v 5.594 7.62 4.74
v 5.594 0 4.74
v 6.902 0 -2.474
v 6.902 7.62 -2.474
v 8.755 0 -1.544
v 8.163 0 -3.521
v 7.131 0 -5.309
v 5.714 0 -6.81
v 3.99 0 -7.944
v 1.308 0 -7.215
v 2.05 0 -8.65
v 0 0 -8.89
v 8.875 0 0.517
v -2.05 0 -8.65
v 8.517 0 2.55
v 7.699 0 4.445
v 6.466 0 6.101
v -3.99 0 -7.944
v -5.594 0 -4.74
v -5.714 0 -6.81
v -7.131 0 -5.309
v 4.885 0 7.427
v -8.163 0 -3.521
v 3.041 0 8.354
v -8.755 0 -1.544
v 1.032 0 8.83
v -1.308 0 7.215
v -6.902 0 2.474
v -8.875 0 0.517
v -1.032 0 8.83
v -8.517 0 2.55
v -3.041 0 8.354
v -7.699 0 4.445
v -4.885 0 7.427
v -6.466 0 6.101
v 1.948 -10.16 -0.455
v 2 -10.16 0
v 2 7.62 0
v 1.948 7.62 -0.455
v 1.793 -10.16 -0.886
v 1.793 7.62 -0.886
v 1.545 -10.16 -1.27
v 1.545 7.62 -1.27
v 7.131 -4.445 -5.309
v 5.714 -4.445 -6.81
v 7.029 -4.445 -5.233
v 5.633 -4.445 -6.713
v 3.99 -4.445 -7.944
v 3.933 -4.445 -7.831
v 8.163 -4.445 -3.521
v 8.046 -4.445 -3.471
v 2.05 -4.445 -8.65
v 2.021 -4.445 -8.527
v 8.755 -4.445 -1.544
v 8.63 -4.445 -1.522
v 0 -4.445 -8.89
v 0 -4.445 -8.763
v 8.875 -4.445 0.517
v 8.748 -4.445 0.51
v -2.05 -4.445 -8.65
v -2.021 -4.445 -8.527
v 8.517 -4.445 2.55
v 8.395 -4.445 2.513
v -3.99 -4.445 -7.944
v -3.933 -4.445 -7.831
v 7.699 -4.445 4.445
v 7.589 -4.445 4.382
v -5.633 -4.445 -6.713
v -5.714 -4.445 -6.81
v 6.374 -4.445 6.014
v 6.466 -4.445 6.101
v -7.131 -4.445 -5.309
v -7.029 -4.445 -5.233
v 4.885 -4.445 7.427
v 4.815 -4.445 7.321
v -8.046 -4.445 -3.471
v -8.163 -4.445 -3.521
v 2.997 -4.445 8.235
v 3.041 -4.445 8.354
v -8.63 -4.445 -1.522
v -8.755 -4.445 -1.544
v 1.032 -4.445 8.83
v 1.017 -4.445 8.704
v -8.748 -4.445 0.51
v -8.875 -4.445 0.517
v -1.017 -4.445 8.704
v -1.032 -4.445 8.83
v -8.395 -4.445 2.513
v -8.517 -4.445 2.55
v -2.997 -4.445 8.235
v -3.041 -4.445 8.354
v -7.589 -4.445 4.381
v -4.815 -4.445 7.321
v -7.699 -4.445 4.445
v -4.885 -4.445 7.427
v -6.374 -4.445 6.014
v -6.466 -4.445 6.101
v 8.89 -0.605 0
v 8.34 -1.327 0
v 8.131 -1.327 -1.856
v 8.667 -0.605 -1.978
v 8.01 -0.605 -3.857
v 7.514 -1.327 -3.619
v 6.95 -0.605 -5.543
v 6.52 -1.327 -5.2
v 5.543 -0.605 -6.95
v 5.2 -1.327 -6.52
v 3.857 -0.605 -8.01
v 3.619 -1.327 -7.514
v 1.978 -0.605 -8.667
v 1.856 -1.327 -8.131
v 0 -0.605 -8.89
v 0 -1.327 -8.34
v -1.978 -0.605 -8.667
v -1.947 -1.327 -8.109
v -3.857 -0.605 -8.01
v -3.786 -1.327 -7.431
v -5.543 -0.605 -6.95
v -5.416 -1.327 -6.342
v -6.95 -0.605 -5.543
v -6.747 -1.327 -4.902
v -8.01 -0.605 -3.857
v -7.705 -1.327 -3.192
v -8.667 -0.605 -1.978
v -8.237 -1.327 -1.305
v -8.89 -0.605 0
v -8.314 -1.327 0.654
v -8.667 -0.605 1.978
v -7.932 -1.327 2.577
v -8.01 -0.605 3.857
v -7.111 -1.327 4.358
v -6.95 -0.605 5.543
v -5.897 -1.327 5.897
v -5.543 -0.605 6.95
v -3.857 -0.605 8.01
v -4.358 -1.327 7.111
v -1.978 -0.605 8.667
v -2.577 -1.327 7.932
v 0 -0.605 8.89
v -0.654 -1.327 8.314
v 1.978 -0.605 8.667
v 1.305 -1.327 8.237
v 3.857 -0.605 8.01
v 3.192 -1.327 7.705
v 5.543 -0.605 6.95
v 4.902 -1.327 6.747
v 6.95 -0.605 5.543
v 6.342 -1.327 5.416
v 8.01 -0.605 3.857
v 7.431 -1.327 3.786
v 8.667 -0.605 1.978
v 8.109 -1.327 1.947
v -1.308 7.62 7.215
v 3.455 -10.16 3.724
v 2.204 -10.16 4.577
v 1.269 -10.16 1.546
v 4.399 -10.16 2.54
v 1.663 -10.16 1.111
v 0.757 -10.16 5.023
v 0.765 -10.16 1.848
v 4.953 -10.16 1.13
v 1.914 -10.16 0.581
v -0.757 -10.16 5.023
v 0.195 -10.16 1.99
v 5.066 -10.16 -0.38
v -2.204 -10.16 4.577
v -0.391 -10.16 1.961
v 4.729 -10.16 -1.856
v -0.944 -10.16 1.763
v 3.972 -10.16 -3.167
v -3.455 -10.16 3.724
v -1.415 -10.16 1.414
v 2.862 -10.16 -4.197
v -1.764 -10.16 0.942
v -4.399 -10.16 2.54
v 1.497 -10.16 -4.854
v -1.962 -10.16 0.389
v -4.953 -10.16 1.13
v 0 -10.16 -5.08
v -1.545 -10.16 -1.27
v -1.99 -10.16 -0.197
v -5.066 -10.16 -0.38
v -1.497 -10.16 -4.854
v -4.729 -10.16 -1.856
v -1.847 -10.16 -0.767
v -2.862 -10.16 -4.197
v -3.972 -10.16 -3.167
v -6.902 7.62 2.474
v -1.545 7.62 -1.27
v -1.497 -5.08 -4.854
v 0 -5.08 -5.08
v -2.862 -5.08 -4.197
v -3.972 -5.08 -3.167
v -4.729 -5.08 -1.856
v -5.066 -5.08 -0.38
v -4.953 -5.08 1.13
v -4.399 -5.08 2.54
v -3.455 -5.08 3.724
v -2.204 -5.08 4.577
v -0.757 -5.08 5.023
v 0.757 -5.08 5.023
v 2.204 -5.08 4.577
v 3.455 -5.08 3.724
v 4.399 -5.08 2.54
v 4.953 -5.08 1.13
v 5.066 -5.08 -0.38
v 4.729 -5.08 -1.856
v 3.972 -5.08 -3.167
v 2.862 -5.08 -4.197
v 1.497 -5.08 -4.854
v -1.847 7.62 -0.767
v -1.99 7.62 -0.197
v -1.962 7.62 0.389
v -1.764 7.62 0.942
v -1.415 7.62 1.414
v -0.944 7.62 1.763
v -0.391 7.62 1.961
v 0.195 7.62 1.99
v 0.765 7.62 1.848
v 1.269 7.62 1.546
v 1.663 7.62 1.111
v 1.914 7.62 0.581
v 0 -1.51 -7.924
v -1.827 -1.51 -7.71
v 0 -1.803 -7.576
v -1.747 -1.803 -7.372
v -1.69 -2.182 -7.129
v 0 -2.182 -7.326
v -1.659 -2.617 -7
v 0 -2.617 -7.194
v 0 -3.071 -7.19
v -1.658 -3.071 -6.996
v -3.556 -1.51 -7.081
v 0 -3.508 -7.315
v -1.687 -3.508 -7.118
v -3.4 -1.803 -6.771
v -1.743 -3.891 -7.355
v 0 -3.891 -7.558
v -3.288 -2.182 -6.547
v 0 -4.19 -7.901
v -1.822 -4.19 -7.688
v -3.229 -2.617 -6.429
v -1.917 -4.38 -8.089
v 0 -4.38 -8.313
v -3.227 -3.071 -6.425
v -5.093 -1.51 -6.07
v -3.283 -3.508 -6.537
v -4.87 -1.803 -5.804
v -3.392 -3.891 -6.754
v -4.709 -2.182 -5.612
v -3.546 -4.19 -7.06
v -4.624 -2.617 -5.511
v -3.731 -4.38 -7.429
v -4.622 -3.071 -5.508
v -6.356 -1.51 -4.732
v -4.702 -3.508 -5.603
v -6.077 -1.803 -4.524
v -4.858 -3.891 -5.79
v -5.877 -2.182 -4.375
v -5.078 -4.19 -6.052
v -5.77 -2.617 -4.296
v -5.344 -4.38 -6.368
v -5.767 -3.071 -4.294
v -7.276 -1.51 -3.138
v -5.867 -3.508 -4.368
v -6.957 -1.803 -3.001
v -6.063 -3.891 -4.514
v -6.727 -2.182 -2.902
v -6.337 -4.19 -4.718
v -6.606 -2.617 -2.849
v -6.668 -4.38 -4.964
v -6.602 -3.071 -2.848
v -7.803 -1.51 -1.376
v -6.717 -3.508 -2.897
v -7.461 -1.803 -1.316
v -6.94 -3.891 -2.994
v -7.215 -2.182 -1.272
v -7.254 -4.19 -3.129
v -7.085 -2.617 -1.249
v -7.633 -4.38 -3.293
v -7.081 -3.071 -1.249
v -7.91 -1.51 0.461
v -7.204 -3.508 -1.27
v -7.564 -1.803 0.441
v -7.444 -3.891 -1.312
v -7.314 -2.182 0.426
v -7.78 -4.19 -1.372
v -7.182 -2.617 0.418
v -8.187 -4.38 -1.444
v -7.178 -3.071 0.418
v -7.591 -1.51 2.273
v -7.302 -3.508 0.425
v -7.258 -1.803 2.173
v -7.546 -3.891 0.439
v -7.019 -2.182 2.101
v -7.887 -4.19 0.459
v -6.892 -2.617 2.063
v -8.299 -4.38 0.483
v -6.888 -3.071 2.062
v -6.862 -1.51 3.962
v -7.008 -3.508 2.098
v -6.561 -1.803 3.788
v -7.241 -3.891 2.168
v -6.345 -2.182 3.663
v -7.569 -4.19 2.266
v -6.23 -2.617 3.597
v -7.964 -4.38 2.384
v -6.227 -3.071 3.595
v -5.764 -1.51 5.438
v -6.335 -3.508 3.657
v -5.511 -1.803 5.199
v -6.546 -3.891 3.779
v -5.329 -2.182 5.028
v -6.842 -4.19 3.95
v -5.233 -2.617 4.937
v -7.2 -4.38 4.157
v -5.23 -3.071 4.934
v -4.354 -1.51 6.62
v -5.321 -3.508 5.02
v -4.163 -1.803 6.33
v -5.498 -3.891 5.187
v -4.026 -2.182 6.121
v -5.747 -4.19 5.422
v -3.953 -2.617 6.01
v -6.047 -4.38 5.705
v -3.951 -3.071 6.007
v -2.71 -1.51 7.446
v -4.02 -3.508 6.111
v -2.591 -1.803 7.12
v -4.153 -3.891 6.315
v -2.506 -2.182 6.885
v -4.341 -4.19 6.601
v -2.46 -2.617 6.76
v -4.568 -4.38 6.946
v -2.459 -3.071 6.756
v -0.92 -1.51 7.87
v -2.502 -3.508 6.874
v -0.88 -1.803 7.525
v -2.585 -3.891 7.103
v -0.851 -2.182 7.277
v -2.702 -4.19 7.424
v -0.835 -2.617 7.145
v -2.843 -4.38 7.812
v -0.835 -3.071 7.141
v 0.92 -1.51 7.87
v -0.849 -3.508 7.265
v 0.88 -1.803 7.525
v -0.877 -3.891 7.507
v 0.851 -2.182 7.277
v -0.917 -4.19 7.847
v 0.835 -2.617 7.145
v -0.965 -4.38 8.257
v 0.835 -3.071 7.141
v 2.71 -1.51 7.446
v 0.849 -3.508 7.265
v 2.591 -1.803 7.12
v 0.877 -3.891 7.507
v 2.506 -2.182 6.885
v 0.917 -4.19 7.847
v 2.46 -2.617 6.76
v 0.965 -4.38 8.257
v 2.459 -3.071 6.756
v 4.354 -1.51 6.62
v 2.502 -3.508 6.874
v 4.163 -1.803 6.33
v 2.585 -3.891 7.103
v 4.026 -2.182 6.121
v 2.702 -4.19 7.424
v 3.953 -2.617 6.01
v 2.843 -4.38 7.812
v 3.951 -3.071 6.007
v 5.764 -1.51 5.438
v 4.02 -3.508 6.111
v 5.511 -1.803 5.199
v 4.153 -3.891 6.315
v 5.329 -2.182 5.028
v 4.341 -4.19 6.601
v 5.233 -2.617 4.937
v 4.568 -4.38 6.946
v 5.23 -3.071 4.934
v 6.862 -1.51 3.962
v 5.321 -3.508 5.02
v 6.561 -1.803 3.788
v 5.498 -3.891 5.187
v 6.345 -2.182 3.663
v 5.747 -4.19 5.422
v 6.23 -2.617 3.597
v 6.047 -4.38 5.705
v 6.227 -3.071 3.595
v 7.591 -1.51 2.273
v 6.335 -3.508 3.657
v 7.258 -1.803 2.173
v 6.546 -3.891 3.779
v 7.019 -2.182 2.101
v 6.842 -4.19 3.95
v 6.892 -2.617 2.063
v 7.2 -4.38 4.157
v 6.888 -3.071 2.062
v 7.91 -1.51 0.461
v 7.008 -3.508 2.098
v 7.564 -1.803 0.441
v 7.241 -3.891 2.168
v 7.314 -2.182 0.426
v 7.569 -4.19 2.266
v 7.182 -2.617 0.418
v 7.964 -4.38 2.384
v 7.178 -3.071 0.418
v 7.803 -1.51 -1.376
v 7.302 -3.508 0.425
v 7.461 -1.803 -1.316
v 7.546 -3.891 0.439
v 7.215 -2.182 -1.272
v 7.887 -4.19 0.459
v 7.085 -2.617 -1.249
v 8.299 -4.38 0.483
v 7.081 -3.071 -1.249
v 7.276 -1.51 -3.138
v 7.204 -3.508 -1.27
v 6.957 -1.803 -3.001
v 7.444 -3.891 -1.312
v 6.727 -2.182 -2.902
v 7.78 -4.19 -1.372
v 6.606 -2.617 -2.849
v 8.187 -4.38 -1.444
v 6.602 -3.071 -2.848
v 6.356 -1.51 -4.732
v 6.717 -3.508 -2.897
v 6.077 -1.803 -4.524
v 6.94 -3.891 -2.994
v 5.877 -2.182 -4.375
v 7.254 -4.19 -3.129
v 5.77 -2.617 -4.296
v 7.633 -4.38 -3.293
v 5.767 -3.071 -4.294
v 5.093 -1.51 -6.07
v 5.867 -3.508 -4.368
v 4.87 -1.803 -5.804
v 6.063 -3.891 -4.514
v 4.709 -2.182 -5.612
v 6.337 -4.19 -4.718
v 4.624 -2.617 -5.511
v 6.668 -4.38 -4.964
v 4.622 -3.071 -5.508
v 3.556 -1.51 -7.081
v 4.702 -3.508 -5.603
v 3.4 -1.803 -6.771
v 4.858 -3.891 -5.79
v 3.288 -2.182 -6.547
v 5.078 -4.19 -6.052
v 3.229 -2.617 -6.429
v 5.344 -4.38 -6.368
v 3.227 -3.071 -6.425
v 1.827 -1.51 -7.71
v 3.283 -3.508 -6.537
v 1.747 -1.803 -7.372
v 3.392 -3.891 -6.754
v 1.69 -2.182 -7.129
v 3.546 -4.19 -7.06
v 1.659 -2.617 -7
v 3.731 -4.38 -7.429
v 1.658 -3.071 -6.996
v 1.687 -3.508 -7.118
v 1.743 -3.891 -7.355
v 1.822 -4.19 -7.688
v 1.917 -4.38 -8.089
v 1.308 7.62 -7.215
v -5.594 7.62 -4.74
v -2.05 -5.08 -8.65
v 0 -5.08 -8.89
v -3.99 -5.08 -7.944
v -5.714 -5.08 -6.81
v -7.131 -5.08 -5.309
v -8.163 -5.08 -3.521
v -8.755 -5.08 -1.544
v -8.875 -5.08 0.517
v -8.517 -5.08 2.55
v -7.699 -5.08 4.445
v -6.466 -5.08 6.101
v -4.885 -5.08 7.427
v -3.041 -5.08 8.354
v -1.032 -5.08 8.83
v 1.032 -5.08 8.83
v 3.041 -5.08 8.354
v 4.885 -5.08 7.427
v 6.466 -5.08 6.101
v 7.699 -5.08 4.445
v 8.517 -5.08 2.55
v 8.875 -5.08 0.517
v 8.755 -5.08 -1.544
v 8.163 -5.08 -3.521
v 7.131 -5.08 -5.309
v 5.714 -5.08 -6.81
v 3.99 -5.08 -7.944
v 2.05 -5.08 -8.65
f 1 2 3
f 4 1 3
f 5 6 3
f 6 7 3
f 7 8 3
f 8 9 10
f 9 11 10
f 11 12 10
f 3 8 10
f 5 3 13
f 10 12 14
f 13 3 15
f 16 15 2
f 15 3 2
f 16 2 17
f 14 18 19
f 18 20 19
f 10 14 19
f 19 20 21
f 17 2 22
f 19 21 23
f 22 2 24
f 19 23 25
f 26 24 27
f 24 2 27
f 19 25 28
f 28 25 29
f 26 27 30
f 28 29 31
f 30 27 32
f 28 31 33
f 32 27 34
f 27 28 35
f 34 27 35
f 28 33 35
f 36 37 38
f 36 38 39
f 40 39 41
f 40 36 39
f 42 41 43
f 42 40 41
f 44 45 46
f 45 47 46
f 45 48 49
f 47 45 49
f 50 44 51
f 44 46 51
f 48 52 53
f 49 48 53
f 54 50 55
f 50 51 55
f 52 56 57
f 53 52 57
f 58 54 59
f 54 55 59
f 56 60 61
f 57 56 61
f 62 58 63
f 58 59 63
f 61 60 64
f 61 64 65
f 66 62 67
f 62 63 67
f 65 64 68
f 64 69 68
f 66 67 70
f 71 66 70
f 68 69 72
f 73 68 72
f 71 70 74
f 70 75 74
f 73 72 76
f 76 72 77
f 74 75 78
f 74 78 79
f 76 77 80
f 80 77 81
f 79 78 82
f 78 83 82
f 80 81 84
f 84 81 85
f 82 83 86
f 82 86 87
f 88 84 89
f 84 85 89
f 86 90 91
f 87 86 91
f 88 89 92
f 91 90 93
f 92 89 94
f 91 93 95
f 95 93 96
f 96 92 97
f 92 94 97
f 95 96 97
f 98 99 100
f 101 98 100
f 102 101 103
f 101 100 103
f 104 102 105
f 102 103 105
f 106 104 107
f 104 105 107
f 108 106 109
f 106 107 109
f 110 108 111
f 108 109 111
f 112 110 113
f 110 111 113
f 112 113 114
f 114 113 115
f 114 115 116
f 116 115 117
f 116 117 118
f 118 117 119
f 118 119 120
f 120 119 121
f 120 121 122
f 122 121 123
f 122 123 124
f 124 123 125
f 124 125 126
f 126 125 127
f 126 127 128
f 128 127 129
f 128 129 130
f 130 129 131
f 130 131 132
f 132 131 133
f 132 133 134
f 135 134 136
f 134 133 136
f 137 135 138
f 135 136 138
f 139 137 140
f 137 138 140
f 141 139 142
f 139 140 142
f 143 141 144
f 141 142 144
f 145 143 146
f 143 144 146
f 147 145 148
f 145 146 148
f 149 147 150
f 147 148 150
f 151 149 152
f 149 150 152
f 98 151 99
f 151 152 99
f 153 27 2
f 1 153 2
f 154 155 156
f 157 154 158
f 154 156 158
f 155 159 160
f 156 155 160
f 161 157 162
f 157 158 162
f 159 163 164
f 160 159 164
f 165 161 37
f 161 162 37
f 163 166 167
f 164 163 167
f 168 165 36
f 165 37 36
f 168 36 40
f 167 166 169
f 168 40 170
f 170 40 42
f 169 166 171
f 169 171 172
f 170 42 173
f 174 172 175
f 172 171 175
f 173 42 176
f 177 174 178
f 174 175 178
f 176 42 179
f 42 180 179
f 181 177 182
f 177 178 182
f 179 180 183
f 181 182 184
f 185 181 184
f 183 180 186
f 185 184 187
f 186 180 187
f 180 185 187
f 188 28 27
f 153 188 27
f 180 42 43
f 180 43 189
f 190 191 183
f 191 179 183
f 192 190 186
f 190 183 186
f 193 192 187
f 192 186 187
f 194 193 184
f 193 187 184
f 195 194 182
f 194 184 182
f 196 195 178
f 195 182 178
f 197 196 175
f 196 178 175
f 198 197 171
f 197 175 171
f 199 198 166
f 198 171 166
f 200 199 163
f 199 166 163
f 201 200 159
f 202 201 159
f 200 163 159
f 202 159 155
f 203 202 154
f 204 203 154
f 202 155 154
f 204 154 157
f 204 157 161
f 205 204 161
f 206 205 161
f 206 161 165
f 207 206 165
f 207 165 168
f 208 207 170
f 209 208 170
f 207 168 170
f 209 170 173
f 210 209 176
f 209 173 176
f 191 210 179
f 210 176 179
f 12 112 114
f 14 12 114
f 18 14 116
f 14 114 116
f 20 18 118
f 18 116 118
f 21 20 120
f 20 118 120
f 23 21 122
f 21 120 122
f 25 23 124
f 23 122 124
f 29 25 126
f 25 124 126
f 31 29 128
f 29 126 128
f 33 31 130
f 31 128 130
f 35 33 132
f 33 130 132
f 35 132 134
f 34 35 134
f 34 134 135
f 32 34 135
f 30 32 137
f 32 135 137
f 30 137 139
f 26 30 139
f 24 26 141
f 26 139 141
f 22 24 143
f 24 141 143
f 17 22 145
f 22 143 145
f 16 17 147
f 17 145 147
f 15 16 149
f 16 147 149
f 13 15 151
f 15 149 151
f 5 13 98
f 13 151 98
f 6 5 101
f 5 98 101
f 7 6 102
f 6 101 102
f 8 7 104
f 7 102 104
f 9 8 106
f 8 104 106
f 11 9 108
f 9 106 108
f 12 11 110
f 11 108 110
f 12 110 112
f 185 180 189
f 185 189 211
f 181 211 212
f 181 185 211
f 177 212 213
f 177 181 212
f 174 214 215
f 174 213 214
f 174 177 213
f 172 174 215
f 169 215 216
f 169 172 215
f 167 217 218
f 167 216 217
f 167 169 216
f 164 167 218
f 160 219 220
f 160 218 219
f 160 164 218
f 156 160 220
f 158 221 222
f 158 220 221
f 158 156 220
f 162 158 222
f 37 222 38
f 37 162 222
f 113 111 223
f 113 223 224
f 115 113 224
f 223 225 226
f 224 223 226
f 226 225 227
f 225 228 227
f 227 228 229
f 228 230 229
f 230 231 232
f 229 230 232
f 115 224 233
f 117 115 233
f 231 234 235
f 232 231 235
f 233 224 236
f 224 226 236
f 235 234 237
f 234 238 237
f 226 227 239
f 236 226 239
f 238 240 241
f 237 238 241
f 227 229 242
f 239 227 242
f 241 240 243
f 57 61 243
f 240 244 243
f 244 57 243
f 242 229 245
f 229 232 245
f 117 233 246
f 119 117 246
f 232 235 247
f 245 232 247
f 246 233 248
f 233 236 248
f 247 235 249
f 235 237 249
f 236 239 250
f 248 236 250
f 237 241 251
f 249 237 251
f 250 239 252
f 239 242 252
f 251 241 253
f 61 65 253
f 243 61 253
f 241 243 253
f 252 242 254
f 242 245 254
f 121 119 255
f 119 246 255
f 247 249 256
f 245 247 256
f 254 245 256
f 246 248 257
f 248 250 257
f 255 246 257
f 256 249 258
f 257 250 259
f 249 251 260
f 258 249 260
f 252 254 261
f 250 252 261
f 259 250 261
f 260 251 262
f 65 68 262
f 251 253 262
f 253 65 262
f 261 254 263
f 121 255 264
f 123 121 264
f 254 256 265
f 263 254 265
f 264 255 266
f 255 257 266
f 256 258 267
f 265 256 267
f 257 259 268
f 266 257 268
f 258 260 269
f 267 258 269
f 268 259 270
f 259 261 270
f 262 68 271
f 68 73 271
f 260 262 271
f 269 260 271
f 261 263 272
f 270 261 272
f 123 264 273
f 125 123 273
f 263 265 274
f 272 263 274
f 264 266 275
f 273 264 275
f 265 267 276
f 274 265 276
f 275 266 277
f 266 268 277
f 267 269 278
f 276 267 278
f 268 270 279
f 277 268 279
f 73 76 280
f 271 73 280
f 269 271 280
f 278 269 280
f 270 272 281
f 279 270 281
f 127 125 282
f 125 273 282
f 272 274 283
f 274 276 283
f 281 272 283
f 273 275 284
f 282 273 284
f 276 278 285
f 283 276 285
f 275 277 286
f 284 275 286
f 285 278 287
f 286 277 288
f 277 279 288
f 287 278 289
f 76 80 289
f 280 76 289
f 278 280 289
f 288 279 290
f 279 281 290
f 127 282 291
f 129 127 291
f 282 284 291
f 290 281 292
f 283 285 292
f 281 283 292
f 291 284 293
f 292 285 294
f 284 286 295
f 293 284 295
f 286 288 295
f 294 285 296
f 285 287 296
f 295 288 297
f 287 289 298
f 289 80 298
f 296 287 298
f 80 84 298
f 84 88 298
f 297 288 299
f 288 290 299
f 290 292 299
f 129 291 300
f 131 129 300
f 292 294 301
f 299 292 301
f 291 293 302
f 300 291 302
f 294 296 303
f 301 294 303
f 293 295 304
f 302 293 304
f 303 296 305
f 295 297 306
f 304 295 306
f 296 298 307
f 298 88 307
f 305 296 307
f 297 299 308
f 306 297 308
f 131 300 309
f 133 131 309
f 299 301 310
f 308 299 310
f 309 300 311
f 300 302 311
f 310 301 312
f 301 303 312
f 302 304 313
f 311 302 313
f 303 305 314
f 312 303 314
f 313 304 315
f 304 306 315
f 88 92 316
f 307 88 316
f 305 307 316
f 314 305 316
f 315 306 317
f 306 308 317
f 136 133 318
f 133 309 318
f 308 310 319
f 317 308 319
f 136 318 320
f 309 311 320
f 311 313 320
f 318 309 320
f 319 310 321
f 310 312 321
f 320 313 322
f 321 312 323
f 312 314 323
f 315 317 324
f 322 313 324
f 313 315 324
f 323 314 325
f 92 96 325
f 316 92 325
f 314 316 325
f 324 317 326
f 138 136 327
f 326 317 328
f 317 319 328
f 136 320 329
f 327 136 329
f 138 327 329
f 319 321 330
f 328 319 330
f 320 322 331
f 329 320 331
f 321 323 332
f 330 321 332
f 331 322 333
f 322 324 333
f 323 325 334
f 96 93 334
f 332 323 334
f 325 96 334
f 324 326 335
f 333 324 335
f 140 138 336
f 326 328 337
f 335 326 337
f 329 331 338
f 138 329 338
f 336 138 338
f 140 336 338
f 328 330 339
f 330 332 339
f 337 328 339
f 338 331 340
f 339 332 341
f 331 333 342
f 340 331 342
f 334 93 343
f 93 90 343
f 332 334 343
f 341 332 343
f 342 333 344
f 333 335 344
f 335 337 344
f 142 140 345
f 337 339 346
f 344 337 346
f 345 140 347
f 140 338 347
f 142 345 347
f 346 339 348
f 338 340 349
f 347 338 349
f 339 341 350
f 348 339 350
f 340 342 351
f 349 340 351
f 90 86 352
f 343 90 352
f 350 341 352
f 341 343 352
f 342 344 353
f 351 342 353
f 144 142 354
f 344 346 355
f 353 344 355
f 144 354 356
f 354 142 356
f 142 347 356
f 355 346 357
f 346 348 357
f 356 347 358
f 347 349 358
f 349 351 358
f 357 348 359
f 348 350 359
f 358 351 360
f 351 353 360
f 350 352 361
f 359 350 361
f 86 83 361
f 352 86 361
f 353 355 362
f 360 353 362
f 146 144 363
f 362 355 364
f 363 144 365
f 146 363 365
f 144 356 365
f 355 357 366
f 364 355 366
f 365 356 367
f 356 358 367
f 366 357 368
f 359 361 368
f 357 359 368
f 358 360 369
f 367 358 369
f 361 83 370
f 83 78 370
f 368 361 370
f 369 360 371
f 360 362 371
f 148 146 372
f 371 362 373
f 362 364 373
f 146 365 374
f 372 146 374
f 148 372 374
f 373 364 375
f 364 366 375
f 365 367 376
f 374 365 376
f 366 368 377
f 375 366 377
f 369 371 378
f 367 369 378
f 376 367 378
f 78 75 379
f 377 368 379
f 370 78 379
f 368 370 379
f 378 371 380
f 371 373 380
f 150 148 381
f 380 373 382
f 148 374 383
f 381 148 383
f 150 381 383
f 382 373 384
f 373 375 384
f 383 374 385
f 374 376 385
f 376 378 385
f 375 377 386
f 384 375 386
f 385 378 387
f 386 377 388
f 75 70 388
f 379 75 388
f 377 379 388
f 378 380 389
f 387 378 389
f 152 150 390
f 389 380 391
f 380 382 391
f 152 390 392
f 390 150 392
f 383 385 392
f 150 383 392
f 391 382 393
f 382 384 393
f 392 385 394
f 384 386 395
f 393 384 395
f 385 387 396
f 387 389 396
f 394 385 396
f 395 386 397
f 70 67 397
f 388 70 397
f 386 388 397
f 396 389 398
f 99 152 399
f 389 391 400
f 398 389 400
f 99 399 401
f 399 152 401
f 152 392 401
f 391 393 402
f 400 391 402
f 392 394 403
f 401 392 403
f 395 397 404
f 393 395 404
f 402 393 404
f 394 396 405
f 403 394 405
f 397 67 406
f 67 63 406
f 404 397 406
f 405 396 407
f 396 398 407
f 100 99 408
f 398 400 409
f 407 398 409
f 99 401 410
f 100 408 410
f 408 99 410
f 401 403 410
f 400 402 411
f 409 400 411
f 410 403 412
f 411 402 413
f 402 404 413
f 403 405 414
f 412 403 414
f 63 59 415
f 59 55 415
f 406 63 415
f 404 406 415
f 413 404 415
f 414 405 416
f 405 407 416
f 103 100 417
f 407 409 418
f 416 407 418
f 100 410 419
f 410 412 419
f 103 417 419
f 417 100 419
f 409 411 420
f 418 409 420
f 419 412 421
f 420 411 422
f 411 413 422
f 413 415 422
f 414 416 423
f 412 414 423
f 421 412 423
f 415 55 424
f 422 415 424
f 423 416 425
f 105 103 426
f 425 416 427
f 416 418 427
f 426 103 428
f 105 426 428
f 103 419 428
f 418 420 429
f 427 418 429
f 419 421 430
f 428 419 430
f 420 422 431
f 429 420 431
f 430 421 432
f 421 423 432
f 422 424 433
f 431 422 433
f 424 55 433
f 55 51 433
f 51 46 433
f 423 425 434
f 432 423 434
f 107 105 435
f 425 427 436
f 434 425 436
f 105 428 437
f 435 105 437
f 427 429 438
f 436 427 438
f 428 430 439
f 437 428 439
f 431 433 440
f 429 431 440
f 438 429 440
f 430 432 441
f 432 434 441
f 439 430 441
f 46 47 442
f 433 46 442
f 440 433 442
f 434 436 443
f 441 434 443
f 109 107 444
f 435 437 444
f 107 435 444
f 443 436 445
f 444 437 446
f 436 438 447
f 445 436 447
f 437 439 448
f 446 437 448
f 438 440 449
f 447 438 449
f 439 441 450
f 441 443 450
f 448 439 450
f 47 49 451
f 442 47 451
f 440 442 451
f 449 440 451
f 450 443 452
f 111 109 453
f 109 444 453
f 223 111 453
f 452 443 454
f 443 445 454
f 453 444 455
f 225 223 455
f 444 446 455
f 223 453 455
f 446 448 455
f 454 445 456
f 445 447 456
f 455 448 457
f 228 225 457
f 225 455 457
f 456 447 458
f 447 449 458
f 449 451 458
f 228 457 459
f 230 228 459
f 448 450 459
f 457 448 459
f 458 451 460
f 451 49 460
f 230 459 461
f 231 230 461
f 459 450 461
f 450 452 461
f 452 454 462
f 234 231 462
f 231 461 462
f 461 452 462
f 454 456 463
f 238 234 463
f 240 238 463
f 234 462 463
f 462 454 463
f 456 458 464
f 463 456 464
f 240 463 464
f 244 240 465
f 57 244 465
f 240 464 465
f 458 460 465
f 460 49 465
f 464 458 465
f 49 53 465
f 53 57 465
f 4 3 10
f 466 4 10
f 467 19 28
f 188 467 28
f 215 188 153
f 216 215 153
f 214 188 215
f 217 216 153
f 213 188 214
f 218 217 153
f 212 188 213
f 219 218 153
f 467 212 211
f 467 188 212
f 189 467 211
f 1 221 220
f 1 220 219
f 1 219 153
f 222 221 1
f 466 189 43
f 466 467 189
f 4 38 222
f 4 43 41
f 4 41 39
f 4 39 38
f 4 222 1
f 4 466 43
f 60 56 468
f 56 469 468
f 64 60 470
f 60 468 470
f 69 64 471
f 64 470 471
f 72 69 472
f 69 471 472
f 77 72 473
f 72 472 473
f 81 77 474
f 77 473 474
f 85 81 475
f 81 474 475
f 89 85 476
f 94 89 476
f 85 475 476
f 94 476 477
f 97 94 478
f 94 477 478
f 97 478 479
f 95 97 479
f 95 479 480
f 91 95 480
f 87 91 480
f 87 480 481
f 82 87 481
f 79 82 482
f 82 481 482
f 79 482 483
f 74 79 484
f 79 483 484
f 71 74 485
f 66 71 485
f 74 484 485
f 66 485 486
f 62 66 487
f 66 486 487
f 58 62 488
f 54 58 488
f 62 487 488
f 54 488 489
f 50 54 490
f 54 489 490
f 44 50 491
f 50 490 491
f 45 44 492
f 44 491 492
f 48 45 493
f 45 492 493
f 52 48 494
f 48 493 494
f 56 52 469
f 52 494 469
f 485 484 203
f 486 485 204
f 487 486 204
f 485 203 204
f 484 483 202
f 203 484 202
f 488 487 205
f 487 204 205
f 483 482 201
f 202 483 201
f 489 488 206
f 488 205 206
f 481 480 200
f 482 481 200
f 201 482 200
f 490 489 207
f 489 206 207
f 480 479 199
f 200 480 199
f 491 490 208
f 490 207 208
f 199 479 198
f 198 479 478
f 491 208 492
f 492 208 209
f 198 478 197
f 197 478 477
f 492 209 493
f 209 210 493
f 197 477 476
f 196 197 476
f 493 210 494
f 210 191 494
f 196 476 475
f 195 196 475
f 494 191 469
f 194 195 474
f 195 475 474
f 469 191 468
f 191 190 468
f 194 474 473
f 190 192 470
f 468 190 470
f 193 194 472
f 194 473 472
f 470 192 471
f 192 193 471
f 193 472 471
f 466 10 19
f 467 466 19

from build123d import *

# Parameters (mm, degrees)
BOSS_EXTRUDE1_DEPTH    = 7.62
MOTOR_SHAFT_DEPTH      = 17.164461018
MOTOR_SHAFT_DEPTH_BACK = 17.164461018


with BuildPart() as part:
    # Sketch1 → Boss-Extrude1 (new body)
    with BuildSketch(Plane(origin=(0, 0, 0), x_dir=(1, 0, 0), z_dir=(0, 1, 0))):
        Polygon((6.902283212, 2.474231151), (1.308394574, 7.214668182), (-5.593888638, 4.74043703), (-6.902283212, -2.474231151), (-1.308394574, -7.214668182), (5.593888638, -4.74043703), align=None)
    extrude(amount=BOSS_EXTRUDE1_DEPTH)

    # Sketch5 → Revolve1 (revolve)
    with BuildSketch(Plane(origin=(0, 0, 0), x_dir=(0, 0, -1), z_dir=(1, 0, 0)), mode=Mode.PRIVATE) as revolve1_sk:
        with BuildLine():
            Line((0, 0), (-8.89, 0))
            Line((-8.89, 0), (-8.89, -1.27))
            Line((-8.89, -1.27), (-8.763, -1.27))
            ThreePointArc((-8.763, -1.27), (-7.1755, -2.8575), (-8.763, -4.445))
            Line((-8.763, -4.445), (-8.89, -4.445))
            Line((-8.89, -4.445), (-8.89, -5.08))
            Line((-8.89, -5.08), (-5.08, -5.08))
            Line((-5.08, -5.08), (-5.08, -10.16))
            Line((-5.08, -10.16), (0, -10.16))
            Line((0, -10.16), (0, -5.08))
            Line((0, -5.08), (0, 0))
        make_face()
    revolve(revolve1_sk.sketch.rotate(Axis((0, 0, 0), (0, 1, 0)), 180), axis=Axis((0, 0, 0), (0, 1, 0)))

    # Chamfer5: read off the stored shape, not the designer's step
    # Chamfer5 outline → Chamfer5 (revolve, cut)
    with BuildSketch(Plane.XY):
        Polygon((8.339893048, -1.32742263), (8.763, -1.32742263), (8.763, -1.27), (8.89, -1.27), (8.89, -0.604551432), align=None)
    revolve(axis=Axis((0, 0, 0), (0, 1, 0)), mode=Mode.SUBTRACT)

    # Sketch10 → motor shaft (cut, two sides: drawn at the far end of the back side and taken through both)
    with BuildSketch(Plane(origin=(0, 0, 0), x_dir=(1, 0, 0), z_dir=(0, 1, 0)).offset(-MOTOR_SHAFT_DEPTH_BACK)):
        with BuildLine():
            Line((1.545024355, 1.27), (-1.545024355, 1.27))
            ThreePointArc((-1.545024355, 1.27), (-0.674518883, -1.882823553), (2.000000064, 0))
            ThreePointArc((2.000000064, 0), (1.882823553, 0.674518883), (1.545024355, 1.27))
        make_face()
    extrude(amount=MOTOR_SHAFT_DEPTH + MOTOR_SHAFT_DEPTH_BACK, mode=Mode.SUBTRACT)


solid = part.part
